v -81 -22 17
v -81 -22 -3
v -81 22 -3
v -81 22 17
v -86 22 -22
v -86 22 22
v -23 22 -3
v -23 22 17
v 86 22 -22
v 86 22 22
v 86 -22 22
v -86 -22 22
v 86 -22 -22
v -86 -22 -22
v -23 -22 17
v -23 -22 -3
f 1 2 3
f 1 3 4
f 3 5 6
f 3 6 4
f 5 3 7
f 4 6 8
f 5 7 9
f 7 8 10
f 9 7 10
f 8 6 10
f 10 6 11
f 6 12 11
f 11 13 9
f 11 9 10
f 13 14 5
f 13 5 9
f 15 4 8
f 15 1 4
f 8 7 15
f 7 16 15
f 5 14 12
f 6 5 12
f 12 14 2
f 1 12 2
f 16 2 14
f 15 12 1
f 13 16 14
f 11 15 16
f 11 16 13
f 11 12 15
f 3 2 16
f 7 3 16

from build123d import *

# Parameters (mm, degrees)
F0_W     = 172
F0_H     = 44
F0_W_2   = 58
F0_H_2   = 20
F1_DEPTH = 22


with BuildPart() as f1:
    # F0 (on Front) → F1 (new body, symmetric)
    with BuildSketch(Plane.XZ):
        Rectangle(F0_W, F0_H)
        with Locations((-52, 7)):
            Rectangle(F0_W_2, F0_H_2, mode=Mode.SUBTRACT)
    extrude(amount=F1_DEPTH, both=True)


solid = f1.part
